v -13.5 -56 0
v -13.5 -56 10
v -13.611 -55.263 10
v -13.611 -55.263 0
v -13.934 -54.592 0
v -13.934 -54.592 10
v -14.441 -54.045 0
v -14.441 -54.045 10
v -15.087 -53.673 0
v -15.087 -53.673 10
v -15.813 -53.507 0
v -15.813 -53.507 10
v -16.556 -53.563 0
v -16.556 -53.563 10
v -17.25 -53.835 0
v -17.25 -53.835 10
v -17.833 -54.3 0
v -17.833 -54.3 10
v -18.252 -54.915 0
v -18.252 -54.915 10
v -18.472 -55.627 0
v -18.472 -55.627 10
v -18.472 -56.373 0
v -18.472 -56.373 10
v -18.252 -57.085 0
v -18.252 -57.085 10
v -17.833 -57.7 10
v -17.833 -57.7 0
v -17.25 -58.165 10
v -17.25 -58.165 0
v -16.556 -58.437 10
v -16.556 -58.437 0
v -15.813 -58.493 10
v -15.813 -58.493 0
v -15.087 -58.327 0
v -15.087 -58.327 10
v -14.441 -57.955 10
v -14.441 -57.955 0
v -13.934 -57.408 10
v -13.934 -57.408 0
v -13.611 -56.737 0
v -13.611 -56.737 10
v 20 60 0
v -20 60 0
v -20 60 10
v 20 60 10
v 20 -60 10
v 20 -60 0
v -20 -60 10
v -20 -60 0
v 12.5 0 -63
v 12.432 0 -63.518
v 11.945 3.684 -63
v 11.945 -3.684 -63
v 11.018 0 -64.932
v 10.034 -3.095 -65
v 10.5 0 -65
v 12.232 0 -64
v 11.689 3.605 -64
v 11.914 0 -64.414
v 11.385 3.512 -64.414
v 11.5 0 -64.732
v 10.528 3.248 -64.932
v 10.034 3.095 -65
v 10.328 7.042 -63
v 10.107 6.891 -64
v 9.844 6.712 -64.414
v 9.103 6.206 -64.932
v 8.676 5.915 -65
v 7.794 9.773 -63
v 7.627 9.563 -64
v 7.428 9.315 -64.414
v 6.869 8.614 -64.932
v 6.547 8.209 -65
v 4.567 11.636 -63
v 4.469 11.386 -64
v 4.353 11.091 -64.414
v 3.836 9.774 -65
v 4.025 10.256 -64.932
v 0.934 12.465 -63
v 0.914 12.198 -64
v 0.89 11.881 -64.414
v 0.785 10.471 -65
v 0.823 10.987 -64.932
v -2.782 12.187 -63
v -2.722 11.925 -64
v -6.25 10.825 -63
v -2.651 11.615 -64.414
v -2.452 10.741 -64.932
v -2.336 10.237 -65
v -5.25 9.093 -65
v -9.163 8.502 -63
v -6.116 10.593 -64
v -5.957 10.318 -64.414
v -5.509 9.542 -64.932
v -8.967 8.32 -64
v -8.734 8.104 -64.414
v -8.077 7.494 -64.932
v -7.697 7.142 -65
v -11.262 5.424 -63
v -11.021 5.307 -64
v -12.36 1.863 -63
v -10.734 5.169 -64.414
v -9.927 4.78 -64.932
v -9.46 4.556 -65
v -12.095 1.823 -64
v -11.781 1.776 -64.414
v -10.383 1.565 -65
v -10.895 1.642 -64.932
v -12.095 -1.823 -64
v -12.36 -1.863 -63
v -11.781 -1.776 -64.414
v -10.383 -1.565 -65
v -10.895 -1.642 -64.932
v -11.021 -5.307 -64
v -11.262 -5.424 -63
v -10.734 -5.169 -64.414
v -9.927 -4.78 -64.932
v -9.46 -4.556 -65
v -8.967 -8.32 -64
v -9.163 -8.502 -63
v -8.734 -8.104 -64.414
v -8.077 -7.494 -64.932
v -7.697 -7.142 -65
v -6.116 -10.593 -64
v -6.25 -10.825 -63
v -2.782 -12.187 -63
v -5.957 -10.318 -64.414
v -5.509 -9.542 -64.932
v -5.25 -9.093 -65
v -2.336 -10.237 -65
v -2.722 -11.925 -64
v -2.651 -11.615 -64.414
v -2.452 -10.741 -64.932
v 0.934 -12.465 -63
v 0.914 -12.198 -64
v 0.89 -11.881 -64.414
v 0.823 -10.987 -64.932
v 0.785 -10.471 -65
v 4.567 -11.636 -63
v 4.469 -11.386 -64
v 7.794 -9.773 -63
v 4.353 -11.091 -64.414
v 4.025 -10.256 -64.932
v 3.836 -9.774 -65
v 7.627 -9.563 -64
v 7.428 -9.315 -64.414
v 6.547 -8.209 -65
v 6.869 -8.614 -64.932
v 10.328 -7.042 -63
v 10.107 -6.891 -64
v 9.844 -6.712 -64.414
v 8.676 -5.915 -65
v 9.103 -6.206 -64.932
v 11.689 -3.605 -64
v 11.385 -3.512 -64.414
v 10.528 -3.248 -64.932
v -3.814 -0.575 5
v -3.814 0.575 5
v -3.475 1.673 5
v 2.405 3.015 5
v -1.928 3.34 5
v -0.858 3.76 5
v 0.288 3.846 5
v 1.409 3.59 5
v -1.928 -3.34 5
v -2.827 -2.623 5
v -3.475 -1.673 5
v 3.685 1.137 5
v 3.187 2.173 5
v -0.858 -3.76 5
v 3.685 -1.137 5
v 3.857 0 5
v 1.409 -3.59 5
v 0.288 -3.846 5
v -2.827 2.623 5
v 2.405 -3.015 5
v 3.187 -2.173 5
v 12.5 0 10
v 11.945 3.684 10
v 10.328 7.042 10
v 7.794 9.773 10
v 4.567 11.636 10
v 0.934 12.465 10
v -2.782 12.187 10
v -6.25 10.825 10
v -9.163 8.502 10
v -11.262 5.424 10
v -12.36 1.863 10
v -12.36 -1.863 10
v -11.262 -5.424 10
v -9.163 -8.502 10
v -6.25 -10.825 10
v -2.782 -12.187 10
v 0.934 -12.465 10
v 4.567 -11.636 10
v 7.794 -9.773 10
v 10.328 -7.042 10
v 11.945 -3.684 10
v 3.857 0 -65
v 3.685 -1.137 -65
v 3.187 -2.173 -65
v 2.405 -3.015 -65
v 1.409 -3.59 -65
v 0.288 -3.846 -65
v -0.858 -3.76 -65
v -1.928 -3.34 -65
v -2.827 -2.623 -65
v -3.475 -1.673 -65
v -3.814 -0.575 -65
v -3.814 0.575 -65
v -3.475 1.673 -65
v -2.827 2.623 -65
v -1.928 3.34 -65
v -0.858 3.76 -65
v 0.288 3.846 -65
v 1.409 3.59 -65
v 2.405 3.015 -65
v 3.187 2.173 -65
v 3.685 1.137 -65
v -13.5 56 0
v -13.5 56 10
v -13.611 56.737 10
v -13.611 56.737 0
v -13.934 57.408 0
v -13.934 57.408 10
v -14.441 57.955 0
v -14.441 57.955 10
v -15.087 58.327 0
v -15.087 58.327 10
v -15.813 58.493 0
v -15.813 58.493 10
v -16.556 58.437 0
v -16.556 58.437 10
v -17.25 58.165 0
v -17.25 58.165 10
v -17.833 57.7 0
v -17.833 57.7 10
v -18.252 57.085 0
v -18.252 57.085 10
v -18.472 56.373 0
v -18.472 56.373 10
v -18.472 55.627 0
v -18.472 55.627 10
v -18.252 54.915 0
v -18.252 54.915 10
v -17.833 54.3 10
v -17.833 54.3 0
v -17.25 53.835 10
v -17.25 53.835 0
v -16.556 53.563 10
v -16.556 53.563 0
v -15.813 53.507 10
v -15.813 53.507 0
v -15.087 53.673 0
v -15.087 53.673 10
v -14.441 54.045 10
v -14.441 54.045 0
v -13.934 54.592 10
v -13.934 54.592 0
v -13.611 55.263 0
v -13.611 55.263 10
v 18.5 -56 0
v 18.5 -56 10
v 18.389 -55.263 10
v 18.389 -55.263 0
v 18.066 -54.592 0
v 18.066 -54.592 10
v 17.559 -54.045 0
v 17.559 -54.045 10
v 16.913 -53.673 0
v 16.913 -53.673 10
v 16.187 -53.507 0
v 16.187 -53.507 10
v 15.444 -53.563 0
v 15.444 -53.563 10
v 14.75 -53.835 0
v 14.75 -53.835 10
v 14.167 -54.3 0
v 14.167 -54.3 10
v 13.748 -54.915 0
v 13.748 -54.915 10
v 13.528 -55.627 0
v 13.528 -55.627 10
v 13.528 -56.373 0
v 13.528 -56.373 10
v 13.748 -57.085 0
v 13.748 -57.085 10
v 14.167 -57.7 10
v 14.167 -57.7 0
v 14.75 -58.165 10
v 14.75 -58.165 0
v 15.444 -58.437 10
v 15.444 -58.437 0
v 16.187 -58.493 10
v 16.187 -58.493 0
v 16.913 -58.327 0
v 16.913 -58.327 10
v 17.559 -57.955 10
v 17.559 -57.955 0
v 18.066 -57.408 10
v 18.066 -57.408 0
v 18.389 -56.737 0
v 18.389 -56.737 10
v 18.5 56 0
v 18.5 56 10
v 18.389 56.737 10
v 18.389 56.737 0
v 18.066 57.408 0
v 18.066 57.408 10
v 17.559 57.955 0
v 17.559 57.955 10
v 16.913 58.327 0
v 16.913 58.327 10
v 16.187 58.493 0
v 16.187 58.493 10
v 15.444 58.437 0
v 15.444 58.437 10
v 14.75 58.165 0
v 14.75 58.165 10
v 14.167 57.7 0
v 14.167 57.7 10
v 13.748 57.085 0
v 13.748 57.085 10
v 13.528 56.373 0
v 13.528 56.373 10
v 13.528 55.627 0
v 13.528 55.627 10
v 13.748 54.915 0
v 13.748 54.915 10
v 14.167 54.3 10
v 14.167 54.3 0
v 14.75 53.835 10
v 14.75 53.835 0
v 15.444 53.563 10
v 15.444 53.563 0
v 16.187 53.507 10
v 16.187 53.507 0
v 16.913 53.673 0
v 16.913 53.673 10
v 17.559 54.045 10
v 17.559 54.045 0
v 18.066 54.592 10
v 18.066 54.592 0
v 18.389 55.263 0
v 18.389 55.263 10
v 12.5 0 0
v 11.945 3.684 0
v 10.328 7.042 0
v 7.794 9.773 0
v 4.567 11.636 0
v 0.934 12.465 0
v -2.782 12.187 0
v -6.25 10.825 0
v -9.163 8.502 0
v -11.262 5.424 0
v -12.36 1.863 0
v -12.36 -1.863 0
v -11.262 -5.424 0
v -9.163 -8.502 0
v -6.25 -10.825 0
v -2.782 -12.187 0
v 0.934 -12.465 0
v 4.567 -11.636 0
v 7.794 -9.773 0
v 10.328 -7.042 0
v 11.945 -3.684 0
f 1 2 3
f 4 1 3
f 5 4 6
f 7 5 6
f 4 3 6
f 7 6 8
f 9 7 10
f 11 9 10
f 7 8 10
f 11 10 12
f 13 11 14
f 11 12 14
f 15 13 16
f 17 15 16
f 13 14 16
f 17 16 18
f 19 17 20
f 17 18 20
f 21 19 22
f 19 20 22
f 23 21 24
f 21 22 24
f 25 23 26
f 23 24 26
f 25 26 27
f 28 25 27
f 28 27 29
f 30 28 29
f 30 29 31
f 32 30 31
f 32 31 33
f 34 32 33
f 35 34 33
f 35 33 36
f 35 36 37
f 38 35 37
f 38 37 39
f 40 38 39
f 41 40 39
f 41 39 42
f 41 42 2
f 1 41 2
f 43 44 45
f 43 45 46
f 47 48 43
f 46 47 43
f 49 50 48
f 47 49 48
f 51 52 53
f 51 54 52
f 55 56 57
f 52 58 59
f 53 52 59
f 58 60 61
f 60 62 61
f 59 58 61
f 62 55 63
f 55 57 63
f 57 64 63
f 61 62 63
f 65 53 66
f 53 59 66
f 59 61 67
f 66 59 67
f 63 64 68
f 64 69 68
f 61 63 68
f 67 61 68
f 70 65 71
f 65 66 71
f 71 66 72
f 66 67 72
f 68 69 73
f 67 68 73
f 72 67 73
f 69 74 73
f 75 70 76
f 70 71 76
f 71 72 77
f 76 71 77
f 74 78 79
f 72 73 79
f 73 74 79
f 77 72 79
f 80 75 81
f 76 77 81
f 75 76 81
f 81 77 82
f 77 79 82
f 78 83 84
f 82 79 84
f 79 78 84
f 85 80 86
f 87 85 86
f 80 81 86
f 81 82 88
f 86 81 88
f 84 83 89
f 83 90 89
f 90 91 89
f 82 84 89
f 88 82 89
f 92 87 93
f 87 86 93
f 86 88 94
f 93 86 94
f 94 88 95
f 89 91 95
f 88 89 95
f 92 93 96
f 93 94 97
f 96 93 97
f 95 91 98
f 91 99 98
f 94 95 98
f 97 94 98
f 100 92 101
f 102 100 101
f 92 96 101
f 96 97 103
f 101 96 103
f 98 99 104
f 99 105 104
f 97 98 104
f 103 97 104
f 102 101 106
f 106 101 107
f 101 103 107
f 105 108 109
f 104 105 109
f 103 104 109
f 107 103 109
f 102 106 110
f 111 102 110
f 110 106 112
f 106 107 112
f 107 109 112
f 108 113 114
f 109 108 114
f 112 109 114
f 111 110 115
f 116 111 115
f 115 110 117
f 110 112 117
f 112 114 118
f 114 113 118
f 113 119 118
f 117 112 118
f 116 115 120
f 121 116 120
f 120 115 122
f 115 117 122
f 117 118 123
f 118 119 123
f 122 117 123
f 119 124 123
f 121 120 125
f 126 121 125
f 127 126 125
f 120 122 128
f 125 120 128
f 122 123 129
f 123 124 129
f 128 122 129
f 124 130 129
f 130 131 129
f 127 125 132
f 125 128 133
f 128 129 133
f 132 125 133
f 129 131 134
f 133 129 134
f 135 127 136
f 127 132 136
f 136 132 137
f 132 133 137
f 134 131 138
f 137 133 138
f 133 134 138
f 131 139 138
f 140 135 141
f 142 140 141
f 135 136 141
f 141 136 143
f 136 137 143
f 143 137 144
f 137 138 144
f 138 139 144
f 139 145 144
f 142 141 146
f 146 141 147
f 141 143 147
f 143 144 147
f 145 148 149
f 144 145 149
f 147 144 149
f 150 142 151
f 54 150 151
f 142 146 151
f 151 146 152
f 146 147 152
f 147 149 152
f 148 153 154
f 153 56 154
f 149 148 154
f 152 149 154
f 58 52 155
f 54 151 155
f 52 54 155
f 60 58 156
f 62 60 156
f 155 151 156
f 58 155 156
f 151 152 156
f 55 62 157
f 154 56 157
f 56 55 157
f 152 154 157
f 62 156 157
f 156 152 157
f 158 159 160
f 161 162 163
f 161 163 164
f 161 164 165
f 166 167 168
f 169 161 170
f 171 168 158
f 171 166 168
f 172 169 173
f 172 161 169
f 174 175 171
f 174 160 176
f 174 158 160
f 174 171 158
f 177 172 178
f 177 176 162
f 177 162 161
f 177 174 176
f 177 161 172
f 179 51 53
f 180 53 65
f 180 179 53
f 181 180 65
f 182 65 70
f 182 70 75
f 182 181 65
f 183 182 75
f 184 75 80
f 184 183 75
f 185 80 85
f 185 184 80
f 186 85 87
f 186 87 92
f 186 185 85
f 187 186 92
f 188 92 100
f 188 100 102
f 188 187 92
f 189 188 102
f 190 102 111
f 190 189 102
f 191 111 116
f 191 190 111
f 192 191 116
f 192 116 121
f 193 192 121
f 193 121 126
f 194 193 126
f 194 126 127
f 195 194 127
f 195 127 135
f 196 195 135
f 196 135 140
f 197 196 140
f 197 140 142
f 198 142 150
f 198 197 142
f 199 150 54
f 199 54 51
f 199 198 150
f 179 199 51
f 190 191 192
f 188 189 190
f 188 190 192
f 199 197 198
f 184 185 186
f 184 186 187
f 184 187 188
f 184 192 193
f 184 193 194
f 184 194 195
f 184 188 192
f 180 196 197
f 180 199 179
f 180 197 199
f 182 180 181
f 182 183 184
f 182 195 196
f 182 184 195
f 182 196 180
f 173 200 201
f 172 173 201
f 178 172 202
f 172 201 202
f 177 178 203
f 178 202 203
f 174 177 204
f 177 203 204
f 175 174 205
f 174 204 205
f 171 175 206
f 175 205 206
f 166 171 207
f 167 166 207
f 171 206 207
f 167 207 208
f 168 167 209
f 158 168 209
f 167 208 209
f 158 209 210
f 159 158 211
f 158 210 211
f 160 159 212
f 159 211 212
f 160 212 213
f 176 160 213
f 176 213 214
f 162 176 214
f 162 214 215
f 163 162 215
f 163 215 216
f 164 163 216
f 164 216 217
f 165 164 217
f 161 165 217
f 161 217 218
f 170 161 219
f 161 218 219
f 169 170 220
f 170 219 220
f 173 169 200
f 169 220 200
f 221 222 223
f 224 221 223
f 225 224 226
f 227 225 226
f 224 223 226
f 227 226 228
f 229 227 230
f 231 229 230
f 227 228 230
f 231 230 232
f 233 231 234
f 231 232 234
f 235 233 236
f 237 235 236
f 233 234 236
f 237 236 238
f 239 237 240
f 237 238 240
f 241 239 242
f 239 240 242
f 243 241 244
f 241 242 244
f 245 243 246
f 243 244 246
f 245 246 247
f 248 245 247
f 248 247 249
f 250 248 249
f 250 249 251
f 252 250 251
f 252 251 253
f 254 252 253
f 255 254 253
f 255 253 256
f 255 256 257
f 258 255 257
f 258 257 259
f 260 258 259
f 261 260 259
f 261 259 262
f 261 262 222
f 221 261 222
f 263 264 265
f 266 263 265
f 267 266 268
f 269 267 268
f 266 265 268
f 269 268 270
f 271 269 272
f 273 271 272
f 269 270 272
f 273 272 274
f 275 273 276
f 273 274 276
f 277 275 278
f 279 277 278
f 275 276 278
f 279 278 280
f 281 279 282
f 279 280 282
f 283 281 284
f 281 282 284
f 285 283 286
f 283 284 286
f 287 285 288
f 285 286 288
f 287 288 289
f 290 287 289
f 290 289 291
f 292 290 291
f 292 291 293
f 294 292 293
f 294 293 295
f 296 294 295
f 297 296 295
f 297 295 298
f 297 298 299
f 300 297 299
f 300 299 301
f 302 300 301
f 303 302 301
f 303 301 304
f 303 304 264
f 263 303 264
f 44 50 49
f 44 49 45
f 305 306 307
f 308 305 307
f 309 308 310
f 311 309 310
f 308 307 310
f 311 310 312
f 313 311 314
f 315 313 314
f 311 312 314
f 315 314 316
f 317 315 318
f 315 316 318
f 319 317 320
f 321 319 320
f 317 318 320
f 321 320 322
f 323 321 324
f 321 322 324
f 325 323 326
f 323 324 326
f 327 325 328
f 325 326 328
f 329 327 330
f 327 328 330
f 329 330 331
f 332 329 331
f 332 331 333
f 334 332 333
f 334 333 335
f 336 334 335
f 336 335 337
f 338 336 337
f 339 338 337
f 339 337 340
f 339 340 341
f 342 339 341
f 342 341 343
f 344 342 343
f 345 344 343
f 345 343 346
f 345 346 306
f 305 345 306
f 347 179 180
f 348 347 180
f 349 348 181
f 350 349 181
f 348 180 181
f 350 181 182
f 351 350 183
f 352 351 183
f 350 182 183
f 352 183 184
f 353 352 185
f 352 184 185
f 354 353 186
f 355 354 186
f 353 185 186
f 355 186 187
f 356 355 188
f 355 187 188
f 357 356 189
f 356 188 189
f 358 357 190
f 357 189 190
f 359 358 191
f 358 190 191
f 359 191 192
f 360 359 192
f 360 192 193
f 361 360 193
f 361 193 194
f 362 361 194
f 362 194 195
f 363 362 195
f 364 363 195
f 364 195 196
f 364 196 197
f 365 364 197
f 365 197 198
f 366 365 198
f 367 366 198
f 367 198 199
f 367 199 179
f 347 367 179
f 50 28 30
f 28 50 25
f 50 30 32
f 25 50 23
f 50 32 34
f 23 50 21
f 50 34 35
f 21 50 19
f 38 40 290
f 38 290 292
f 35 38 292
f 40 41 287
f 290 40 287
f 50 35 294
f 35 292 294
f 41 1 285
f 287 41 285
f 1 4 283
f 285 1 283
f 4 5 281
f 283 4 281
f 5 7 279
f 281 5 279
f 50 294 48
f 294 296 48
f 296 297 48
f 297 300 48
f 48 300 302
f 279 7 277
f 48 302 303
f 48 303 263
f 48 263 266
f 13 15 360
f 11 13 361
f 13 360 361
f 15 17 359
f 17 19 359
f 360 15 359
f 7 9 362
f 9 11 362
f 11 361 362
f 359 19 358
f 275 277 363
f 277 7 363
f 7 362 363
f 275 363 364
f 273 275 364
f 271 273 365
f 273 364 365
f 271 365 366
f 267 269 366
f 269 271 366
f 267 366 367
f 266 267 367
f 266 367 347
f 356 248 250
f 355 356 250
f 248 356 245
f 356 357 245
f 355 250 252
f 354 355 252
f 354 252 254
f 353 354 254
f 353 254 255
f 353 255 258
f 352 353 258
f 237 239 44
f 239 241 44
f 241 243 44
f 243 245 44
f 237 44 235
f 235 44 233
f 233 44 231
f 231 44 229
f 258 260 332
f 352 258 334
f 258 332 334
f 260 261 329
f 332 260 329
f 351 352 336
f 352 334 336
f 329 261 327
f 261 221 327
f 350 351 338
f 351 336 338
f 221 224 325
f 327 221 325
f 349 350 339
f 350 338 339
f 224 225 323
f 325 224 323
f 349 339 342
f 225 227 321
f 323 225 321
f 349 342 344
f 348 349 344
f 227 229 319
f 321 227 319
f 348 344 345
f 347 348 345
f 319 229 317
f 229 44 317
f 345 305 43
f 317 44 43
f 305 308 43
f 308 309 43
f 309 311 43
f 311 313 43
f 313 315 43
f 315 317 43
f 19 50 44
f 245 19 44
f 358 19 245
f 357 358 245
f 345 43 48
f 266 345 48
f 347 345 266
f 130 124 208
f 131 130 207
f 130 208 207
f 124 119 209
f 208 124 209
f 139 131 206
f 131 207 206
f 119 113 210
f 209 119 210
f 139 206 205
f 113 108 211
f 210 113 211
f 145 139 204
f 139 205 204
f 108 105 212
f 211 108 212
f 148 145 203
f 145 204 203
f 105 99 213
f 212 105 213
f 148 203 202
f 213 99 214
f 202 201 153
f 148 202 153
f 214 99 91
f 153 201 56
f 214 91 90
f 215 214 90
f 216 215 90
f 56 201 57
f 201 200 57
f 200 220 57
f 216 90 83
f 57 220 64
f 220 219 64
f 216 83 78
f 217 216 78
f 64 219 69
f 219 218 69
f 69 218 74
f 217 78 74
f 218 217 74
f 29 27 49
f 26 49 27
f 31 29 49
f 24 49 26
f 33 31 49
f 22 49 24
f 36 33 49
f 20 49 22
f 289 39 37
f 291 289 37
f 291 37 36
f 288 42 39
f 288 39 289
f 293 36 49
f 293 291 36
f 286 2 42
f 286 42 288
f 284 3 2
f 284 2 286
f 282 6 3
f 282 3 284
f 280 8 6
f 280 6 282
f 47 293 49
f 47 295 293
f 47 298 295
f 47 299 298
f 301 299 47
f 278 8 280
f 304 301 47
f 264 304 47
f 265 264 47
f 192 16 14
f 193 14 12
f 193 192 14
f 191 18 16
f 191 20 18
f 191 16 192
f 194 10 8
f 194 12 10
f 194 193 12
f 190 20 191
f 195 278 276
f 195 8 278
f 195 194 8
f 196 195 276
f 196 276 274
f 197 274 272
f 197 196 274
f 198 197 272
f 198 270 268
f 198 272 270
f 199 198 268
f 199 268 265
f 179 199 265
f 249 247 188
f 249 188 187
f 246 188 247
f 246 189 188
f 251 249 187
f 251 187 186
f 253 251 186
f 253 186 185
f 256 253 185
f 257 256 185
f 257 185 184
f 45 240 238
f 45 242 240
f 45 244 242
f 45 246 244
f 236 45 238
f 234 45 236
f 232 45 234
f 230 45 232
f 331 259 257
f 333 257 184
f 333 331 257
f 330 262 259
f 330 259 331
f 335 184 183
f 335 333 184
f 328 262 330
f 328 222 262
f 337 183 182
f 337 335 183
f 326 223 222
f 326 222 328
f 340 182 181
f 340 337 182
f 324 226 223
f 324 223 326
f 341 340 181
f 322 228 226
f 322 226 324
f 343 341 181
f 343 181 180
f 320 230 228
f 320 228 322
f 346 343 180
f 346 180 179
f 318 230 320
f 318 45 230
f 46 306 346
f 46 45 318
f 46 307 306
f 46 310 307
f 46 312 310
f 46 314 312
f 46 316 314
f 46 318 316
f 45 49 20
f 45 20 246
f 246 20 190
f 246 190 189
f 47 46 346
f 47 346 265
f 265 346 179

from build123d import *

# Parameters (mm, degrees)
F0_W     = 40
F0_H     = 120
F1_DEPTH = 10
F2_R     = 12.5
F3_DEPTH = 75
F2_R_2   = 2.5
F4_DEPTH = 25
F5_R     = 2
F6_R     = 3.8567448675
F7_DEPTH = 70


with BuildPart() as f1:
    # F0 (on Top) → F1 (new body)
    with BuildSketch(Plane.XY):
        Rectangle(F0_W, F0_H)
    extrude(amount=F1_DEPTH)

    # F2 (on face) → F4 (cut)
    with BuildSketch(Plane.XY.offset(10)):
        with Locations((-16, 56)):
            Circle(F2_R_2)
        with Locations((16, 56)):
            Circle(F2_R_2)
        with Locations((-16, -56)):
            Circle(F2_R_2)
        with Locations((16, -56)):
            Circle(F2_R_2)
        Circle(F2_R)
    extrude(amount=-F4_DEPTH, mode=Mode.SUBTRACT)


with BuildPart() as f3:
    # F2 (on face) → F3 (new body)
    with BuildSketch(Plane.XY.offset(10)):
        Circle(F2_R)
    extrude(amount=-F3_DEPTH)

    # F5
    f5_edges = [f3.edges().sort_by_distance(p)[0] for p in [
        (-12.5, 0, -65),
    ]]
    fillet(f5_edges, radius=F5_R)

    # F6 (on face) → F7 (cut)
    with BuildSketch(Plane(origin=(0, 0, -65), x_dir=(1, 0, 0), z_dir=(0, 0, -1))):
        Circle(F6_R)
    extrude(amount=-F7_DEPTH, mode=Mode.SUBTRACT)


solid = Compound([f1.part, f3.part])
